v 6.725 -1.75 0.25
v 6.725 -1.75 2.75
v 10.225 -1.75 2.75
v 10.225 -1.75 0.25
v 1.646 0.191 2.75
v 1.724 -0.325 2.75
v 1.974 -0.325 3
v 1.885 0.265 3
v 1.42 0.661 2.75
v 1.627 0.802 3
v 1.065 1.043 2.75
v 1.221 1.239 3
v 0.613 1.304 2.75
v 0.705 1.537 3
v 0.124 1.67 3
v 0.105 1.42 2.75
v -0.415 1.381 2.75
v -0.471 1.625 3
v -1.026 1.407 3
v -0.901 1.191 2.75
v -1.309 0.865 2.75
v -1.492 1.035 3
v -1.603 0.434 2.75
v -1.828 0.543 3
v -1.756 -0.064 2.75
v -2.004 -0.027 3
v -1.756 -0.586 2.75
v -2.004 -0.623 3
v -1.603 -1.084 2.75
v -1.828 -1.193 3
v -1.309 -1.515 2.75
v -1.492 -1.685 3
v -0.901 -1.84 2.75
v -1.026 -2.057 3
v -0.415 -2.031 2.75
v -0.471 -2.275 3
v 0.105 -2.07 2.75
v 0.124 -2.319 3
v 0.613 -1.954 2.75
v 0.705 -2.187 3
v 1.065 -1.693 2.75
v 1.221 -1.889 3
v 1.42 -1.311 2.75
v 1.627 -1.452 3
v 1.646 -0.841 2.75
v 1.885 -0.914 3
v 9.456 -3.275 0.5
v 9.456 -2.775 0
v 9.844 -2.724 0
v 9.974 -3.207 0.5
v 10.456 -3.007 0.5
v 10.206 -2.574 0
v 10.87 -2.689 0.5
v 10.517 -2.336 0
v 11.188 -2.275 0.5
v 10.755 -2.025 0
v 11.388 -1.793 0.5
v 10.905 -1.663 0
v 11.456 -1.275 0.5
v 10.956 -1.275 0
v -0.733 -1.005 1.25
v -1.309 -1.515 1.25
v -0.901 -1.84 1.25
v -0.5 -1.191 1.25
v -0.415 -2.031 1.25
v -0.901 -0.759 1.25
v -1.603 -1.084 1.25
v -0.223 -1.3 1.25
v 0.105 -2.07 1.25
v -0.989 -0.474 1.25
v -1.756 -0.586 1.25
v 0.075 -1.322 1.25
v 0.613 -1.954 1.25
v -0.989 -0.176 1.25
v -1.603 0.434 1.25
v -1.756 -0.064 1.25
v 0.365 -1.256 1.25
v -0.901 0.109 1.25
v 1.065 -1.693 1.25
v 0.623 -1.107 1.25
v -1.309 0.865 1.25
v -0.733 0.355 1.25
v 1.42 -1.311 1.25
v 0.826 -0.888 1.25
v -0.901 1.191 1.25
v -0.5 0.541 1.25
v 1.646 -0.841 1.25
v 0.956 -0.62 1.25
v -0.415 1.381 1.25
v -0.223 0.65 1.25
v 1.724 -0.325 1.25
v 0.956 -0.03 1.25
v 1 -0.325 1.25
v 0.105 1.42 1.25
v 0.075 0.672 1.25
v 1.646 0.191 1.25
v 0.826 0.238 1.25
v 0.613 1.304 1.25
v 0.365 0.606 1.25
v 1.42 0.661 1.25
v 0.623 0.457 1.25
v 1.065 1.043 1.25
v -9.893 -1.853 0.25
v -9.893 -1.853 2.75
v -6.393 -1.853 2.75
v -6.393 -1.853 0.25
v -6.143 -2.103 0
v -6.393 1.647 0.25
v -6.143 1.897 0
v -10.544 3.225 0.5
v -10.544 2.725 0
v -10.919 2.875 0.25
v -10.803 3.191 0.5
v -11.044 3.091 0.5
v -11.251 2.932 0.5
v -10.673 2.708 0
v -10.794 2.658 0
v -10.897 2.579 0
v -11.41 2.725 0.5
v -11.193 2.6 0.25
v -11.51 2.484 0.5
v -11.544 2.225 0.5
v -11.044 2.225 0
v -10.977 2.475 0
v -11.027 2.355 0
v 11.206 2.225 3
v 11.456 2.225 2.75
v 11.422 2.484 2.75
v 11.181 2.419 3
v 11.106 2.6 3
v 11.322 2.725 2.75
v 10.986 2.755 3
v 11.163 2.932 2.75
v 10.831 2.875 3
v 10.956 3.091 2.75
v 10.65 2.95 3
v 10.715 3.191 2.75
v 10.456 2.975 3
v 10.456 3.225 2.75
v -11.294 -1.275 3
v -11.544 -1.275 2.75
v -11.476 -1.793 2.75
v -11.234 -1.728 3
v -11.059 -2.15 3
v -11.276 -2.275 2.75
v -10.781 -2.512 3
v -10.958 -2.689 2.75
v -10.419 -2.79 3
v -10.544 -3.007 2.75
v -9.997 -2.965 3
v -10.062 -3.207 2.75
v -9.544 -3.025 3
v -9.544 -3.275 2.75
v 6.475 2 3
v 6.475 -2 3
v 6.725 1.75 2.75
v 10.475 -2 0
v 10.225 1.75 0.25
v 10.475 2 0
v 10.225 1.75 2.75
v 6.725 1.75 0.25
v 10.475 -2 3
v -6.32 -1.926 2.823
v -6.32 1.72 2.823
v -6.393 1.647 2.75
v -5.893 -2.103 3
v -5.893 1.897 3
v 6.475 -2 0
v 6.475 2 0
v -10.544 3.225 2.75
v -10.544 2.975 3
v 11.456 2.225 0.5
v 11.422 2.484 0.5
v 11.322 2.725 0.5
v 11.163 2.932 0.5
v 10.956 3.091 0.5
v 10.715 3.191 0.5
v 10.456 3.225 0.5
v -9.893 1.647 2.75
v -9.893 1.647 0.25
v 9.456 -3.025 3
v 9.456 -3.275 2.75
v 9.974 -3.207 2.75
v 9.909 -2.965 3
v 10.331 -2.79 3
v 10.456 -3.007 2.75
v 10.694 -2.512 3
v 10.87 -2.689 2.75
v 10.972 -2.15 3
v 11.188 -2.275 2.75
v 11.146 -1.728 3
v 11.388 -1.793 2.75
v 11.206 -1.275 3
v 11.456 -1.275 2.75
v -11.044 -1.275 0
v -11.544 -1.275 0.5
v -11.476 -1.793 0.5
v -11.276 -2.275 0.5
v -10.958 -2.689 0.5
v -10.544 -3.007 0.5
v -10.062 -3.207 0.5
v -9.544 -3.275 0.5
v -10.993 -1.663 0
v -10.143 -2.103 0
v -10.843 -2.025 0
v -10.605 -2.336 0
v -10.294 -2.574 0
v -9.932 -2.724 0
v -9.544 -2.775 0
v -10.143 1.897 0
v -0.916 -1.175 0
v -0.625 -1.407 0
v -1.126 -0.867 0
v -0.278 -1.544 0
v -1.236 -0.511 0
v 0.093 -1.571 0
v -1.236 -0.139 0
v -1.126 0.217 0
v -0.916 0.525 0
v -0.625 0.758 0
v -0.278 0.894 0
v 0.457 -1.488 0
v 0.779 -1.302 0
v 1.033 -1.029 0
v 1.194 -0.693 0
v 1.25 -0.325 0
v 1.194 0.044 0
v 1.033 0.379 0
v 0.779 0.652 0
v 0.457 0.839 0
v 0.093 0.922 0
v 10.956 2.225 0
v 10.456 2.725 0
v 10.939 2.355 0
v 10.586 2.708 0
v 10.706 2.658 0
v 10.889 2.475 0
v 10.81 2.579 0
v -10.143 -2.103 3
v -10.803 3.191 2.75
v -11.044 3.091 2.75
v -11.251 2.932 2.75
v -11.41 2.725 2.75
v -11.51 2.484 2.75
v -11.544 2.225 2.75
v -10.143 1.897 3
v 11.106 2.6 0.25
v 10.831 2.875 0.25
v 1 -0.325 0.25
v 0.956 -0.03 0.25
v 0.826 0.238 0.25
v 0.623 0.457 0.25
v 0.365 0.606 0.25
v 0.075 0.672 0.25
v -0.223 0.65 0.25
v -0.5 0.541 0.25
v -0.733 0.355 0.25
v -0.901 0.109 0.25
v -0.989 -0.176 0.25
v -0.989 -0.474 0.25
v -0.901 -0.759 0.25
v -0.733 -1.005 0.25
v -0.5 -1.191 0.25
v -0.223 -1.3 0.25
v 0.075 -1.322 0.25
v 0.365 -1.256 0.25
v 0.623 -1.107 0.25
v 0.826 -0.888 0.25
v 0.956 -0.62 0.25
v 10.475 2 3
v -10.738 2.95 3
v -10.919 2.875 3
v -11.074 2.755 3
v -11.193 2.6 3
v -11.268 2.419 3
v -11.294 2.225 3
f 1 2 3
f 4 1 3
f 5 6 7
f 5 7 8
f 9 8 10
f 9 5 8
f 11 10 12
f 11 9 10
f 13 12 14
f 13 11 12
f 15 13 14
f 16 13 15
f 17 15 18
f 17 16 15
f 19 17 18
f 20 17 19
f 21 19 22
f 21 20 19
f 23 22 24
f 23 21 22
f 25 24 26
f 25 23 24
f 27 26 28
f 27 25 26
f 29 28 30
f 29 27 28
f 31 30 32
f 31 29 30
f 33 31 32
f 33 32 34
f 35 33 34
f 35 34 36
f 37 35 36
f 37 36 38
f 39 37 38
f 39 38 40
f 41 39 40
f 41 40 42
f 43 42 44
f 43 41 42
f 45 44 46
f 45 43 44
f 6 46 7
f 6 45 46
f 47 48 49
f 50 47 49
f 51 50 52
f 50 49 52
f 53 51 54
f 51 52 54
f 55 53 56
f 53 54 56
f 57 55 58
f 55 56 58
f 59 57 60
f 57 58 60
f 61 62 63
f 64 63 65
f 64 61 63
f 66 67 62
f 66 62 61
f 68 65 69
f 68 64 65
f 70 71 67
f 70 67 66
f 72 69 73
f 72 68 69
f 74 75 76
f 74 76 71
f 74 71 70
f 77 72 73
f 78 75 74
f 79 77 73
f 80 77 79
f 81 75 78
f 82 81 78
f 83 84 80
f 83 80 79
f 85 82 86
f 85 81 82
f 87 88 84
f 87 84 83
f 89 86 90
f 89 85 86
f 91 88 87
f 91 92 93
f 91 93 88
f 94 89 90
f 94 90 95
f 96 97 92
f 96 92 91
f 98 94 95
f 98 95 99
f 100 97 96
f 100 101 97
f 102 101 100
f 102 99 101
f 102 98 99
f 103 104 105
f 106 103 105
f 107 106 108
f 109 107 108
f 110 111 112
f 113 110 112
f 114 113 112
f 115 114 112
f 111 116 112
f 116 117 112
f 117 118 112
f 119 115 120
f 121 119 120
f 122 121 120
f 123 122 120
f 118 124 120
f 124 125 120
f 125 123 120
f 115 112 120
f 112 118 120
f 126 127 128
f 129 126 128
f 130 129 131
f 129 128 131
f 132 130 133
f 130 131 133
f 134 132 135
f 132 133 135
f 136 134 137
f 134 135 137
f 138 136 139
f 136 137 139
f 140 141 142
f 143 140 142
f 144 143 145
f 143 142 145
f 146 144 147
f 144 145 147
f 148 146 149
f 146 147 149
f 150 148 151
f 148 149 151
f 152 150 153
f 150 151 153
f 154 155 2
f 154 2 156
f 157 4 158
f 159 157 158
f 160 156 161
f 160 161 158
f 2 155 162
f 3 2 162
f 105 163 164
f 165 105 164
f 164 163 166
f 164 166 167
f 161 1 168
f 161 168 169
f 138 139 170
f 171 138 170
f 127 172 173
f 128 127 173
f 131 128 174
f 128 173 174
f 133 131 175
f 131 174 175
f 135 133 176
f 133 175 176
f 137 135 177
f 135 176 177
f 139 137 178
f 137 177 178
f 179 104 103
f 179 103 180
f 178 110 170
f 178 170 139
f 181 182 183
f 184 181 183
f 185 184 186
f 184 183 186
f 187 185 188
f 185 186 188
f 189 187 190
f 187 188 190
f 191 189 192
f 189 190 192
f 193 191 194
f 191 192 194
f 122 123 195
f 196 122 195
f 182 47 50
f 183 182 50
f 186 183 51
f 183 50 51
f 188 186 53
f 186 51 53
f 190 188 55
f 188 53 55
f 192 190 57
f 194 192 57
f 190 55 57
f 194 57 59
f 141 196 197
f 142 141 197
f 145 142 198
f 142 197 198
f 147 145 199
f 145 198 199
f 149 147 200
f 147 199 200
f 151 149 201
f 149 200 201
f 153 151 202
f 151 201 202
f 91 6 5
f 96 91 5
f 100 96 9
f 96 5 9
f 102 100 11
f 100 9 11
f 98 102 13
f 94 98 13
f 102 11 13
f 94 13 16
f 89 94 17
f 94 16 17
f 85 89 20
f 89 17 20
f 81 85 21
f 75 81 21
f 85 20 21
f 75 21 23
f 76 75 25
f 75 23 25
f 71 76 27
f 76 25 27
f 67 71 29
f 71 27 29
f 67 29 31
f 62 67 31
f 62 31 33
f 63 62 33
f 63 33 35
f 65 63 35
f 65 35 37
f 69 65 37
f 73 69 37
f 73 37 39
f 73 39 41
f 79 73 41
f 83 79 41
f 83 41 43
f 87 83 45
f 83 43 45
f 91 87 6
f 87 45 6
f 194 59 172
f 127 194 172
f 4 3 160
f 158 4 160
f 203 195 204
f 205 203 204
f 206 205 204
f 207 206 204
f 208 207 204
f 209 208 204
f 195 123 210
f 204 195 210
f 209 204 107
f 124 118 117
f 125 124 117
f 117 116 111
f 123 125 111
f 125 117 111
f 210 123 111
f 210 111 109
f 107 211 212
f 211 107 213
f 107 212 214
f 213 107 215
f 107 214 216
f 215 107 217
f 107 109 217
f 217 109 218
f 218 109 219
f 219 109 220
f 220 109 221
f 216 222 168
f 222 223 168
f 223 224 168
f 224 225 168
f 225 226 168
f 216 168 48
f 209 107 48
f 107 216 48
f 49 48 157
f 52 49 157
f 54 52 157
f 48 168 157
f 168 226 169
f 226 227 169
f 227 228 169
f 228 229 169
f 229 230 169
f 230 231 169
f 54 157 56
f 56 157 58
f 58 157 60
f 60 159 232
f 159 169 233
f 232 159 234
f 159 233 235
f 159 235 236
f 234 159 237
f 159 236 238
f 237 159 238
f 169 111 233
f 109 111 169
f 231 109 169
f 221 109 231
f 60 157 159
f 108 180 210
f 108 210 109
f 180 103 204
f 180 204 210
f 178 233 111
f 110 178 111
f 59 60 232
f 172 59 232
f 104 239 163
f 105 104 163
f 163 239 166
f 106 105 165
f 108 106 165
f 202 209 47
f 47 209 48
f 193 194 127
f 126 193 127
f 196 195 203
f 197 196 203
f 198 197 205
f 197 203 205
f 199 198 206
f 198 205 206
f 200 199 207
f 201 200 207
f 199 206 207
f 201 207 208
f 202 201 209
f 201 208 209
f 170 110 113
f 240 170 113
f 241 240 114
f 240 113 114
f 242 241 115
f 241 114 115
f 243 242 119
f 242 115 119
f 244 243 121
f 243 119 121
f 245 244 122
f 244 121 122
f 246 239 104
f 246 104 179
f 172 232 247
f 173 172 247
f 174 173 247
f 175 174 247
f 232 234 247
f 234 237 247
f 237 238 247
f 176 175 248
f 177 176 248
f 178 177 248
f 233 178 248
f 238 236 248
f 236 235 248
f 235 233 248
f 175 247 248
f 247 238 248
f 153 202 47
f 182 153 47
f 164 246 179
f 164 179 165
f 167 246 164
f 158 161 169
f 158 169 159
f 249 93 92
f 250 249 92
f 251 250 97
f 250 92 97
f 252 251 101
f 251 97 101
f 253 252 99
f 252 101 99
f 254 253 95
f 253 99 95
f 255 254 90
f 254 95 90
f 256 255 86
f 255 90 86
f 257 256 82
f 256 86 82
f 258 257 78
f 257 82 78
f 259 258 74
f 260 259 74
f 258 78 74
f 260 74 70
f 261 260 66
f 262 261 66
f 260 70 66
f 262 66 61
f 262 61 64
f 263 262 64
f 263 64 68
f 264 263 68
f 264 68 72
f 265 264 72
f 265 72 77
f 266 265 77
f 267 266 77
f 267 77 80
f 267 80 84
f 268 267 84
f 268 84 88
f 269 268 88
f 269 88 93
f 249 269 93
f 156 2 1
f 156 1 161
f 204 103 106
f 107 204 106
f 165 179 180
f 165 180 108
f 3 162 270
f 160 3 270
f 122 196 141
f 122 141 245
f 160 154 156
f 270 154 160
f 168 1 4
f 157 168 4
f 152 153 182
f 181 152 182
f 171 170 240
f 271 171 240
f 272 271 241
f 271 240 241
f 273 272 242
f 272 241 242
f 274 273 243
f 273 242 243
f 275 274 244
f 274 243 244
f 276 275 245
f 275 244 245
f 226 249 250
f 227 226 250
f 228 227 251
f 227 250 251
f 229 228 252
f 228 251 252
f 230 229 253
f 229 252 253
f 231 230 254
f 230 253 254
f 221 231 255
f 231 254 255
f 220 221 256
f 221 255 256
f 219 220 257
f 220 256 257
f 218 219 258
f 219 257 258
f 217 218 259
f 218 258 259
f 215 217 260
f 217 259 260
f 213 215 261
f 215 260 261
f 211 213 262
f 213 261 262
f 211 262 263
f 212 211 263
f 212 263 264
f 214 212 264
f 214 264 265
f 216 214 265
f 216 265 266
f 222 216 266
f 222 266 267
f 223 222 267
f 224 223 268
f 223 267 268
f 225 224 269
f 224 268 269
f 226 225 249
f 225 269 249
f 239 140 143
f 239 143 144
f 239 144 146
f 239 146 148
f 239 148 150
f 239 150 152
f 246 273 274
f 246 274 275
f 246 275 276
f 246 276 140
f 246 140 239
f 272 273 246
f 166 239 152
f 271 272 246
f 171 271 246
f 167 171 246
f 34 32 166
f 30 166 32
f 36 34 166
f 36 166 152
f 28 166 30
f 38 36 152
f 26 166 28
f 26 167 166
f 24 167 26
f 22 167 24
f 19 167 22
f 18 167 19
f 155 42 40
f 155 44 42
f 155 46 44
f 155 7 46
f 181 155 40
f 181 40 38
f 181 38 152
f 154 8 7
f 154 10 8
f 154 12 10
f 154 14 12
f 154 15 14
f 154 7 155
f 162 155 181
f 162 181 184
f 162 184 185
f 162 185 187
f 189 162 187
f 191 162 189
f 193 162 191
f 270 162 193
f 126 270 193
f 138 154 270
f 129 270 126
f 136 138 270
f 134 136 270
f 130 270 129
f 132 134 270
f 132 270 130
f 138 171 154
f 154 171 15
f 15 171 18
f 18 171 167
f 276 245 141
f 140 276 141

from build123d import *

# Parameters (mm, degrees)
PAD_DEPTH       = 3
CHAMFER_SIZE    = 0.5
SKETCH005_W     = 3.5
SKETCH005_H     = 3.5
POCKET_DEPTH    = 3.001
SKETCH003_R     = 1
POCKET004_DEPTH = 3.001
CHAMFER005_SIZE = 0.25
CHAMFER008_SIZE = 0.25
CHAMFER009_SIZE = 0.25
SKETCH010_R     = 1.75
POCKET005_DEPTH = 1.75
CHAMFER010_SIZE = 0.25
CHAMFER011_SIZE = 0.25


with BuildPart() as part:
    # Sketch → Pad (new body)
    with BuildSketch(Plane.XY):
        with BuildLine():
            Line((-9.543873, -3.274907), (9.456127, -3.274907))
            ThreePointArc((9.456127, -3.274907), (10.87034, -2.68912), (11.456127, -1.274907))
            Line((11.456127, -1.274907), (11.456127, 2.225093))
            ThreePointArc((11.456127, 2.225093), (11.163233, 2.9322), (10.456127, 3.225093))
            Line((-10.543873, 3.225093), (10.456127, 3.225093))
            ThreePointArc((-10.543873, 3.225093), (-11.25098, 2.9322), (-11.543873, 2.225093))
            Line((-11.543873, -1.274907), (-11.543873, 2.225093))
            ThreePointArc((-11.543873, -1.274907), (-10.958087, -2.68912), (-9.543873, -3.274907))
        make_face()
    extrude(amount=PAD_DEPTH)

    # Chamfer
    chamfer_edges = [part.edges().sort_by_distance(p)[0] for p in [
        (-0.043873, -3.274907, 0),
        (-10.958087, -2.68912, 0),
        (-10.543873, 3.225093, 1.5),
        (11.163233, 2.9322, 0),
        (11.456127, 0.475093, 0),
        (10.87034, -2.68912, 0),
    ]]
    chamfer(chamfer_edges, length=CHAMFER_SIZE)

    # Sketch005 (on DatumPlane) → Pocket (cut, through all)
    with BuildSketch(Plane.XY.offset(3)):
        with Locations((-8.14335, -0.103182)):
            Rectangle(SKETCH005_W, SKETCH005_H)
        with Locations((8.475, 0)):
            Rectangle(SKETCH005_W, SKETCH005_H)
    extrude(amount=-POCKET_DEPTH, mode=Mode.SUBTRACT)

    # Sketch003 (on DatumPlane) → Pocket004 (cut, through all)
    with BuildSketch(Plane.XY.offset(3)):
        with Locations((0, -0.324907)):
            Circle(SKETCH003_R)
    extrude(amount=-POCKET004_DEPTH, mode=Mode.SUBTRACT)

    # Chamfer005
    chamfer005_edges = [part.edges().sort_by_distance(p)[0] for p in [
        (11.456127, 0.475093, 3),
        (10.87034, -2.68912, 3),
        (-0.043873, -3.274907, 3),
        (-10.958087, -2.68912, 3),
        (-11.543873, 0.475093, 3),
        (-11.25098, 2.9322, 3),
        (-0.043873, 3.225093, 3),
        (11.163233, 2.9322, 3),
    ]]
    chamfer(chamfer005_edges, length=CHAMFER005_SIZE)

    # Chamfer008
    chamfer008_edges = [part.edges().sort_by_distance(p)[0] for p in [
        (8.475, -1.75, 0),
        (6.725, 0, 0),
        (8.475, 1.75, 0),
        (10.225, 0, 0),
        (-9.89335, -0.103182, 0),
        (-8.14335, 1.646818, 0),
        (-1, -0.324907, 0),
        (-6.39335, -0.103182, 0),
        (-8.14335, -1.853182, 0),
    ]]
    chamfer(chamfer008_edges, length=CHAMFER008_SIZE)

    # Chamfer009
    chamfer009_edges = [part.edges().sort_by_distance(p)[0] for p in [
        (6.725, 0, 3),
        (8.475, -1.75, 3),
        (10.225, 0, 3),
        (8.475, 1.75, 3),
        (-6.39335, -0.103182, 3),
        (-8.14335, -1.853182, 3),
        (-9.89335, -0.103182, 3),
        (-8.14335, 1.646818, 3),
    ]]
    chamfer(chamfer009_edges, length=CHAMFER009_SIZE)

    # Sketch010 (on Face10 of Chamfer009) → Pocket005 (cut)
    with BuildSketch(Plane.XY.offset(3)):
        with Locations((-0.025921, -0.324907)):
            Circle(SKETCH010_R)
    extrude(amount=-POCKET005_DEPTH, mode=Mode.SUBTRACT)

    # Chamfer010
    chamfer010_edges = [part.edges().sort_by_distance(p)[0] for p in [
        (-6.14335, -0.103182, 3),
    ]]
    chamfer(chamfer010_edges, length=CHAMFER010_SIZE)

    # Chamfer011
    chamfer011_edges = [part.edges().sort_by_distance(p)[0] for p in [
        (-1.775921, -0.324907, 3),
    ]]
    chamfer(chamfer011_edges, length=CHAMFER011_SIZE)


solid = part.part
